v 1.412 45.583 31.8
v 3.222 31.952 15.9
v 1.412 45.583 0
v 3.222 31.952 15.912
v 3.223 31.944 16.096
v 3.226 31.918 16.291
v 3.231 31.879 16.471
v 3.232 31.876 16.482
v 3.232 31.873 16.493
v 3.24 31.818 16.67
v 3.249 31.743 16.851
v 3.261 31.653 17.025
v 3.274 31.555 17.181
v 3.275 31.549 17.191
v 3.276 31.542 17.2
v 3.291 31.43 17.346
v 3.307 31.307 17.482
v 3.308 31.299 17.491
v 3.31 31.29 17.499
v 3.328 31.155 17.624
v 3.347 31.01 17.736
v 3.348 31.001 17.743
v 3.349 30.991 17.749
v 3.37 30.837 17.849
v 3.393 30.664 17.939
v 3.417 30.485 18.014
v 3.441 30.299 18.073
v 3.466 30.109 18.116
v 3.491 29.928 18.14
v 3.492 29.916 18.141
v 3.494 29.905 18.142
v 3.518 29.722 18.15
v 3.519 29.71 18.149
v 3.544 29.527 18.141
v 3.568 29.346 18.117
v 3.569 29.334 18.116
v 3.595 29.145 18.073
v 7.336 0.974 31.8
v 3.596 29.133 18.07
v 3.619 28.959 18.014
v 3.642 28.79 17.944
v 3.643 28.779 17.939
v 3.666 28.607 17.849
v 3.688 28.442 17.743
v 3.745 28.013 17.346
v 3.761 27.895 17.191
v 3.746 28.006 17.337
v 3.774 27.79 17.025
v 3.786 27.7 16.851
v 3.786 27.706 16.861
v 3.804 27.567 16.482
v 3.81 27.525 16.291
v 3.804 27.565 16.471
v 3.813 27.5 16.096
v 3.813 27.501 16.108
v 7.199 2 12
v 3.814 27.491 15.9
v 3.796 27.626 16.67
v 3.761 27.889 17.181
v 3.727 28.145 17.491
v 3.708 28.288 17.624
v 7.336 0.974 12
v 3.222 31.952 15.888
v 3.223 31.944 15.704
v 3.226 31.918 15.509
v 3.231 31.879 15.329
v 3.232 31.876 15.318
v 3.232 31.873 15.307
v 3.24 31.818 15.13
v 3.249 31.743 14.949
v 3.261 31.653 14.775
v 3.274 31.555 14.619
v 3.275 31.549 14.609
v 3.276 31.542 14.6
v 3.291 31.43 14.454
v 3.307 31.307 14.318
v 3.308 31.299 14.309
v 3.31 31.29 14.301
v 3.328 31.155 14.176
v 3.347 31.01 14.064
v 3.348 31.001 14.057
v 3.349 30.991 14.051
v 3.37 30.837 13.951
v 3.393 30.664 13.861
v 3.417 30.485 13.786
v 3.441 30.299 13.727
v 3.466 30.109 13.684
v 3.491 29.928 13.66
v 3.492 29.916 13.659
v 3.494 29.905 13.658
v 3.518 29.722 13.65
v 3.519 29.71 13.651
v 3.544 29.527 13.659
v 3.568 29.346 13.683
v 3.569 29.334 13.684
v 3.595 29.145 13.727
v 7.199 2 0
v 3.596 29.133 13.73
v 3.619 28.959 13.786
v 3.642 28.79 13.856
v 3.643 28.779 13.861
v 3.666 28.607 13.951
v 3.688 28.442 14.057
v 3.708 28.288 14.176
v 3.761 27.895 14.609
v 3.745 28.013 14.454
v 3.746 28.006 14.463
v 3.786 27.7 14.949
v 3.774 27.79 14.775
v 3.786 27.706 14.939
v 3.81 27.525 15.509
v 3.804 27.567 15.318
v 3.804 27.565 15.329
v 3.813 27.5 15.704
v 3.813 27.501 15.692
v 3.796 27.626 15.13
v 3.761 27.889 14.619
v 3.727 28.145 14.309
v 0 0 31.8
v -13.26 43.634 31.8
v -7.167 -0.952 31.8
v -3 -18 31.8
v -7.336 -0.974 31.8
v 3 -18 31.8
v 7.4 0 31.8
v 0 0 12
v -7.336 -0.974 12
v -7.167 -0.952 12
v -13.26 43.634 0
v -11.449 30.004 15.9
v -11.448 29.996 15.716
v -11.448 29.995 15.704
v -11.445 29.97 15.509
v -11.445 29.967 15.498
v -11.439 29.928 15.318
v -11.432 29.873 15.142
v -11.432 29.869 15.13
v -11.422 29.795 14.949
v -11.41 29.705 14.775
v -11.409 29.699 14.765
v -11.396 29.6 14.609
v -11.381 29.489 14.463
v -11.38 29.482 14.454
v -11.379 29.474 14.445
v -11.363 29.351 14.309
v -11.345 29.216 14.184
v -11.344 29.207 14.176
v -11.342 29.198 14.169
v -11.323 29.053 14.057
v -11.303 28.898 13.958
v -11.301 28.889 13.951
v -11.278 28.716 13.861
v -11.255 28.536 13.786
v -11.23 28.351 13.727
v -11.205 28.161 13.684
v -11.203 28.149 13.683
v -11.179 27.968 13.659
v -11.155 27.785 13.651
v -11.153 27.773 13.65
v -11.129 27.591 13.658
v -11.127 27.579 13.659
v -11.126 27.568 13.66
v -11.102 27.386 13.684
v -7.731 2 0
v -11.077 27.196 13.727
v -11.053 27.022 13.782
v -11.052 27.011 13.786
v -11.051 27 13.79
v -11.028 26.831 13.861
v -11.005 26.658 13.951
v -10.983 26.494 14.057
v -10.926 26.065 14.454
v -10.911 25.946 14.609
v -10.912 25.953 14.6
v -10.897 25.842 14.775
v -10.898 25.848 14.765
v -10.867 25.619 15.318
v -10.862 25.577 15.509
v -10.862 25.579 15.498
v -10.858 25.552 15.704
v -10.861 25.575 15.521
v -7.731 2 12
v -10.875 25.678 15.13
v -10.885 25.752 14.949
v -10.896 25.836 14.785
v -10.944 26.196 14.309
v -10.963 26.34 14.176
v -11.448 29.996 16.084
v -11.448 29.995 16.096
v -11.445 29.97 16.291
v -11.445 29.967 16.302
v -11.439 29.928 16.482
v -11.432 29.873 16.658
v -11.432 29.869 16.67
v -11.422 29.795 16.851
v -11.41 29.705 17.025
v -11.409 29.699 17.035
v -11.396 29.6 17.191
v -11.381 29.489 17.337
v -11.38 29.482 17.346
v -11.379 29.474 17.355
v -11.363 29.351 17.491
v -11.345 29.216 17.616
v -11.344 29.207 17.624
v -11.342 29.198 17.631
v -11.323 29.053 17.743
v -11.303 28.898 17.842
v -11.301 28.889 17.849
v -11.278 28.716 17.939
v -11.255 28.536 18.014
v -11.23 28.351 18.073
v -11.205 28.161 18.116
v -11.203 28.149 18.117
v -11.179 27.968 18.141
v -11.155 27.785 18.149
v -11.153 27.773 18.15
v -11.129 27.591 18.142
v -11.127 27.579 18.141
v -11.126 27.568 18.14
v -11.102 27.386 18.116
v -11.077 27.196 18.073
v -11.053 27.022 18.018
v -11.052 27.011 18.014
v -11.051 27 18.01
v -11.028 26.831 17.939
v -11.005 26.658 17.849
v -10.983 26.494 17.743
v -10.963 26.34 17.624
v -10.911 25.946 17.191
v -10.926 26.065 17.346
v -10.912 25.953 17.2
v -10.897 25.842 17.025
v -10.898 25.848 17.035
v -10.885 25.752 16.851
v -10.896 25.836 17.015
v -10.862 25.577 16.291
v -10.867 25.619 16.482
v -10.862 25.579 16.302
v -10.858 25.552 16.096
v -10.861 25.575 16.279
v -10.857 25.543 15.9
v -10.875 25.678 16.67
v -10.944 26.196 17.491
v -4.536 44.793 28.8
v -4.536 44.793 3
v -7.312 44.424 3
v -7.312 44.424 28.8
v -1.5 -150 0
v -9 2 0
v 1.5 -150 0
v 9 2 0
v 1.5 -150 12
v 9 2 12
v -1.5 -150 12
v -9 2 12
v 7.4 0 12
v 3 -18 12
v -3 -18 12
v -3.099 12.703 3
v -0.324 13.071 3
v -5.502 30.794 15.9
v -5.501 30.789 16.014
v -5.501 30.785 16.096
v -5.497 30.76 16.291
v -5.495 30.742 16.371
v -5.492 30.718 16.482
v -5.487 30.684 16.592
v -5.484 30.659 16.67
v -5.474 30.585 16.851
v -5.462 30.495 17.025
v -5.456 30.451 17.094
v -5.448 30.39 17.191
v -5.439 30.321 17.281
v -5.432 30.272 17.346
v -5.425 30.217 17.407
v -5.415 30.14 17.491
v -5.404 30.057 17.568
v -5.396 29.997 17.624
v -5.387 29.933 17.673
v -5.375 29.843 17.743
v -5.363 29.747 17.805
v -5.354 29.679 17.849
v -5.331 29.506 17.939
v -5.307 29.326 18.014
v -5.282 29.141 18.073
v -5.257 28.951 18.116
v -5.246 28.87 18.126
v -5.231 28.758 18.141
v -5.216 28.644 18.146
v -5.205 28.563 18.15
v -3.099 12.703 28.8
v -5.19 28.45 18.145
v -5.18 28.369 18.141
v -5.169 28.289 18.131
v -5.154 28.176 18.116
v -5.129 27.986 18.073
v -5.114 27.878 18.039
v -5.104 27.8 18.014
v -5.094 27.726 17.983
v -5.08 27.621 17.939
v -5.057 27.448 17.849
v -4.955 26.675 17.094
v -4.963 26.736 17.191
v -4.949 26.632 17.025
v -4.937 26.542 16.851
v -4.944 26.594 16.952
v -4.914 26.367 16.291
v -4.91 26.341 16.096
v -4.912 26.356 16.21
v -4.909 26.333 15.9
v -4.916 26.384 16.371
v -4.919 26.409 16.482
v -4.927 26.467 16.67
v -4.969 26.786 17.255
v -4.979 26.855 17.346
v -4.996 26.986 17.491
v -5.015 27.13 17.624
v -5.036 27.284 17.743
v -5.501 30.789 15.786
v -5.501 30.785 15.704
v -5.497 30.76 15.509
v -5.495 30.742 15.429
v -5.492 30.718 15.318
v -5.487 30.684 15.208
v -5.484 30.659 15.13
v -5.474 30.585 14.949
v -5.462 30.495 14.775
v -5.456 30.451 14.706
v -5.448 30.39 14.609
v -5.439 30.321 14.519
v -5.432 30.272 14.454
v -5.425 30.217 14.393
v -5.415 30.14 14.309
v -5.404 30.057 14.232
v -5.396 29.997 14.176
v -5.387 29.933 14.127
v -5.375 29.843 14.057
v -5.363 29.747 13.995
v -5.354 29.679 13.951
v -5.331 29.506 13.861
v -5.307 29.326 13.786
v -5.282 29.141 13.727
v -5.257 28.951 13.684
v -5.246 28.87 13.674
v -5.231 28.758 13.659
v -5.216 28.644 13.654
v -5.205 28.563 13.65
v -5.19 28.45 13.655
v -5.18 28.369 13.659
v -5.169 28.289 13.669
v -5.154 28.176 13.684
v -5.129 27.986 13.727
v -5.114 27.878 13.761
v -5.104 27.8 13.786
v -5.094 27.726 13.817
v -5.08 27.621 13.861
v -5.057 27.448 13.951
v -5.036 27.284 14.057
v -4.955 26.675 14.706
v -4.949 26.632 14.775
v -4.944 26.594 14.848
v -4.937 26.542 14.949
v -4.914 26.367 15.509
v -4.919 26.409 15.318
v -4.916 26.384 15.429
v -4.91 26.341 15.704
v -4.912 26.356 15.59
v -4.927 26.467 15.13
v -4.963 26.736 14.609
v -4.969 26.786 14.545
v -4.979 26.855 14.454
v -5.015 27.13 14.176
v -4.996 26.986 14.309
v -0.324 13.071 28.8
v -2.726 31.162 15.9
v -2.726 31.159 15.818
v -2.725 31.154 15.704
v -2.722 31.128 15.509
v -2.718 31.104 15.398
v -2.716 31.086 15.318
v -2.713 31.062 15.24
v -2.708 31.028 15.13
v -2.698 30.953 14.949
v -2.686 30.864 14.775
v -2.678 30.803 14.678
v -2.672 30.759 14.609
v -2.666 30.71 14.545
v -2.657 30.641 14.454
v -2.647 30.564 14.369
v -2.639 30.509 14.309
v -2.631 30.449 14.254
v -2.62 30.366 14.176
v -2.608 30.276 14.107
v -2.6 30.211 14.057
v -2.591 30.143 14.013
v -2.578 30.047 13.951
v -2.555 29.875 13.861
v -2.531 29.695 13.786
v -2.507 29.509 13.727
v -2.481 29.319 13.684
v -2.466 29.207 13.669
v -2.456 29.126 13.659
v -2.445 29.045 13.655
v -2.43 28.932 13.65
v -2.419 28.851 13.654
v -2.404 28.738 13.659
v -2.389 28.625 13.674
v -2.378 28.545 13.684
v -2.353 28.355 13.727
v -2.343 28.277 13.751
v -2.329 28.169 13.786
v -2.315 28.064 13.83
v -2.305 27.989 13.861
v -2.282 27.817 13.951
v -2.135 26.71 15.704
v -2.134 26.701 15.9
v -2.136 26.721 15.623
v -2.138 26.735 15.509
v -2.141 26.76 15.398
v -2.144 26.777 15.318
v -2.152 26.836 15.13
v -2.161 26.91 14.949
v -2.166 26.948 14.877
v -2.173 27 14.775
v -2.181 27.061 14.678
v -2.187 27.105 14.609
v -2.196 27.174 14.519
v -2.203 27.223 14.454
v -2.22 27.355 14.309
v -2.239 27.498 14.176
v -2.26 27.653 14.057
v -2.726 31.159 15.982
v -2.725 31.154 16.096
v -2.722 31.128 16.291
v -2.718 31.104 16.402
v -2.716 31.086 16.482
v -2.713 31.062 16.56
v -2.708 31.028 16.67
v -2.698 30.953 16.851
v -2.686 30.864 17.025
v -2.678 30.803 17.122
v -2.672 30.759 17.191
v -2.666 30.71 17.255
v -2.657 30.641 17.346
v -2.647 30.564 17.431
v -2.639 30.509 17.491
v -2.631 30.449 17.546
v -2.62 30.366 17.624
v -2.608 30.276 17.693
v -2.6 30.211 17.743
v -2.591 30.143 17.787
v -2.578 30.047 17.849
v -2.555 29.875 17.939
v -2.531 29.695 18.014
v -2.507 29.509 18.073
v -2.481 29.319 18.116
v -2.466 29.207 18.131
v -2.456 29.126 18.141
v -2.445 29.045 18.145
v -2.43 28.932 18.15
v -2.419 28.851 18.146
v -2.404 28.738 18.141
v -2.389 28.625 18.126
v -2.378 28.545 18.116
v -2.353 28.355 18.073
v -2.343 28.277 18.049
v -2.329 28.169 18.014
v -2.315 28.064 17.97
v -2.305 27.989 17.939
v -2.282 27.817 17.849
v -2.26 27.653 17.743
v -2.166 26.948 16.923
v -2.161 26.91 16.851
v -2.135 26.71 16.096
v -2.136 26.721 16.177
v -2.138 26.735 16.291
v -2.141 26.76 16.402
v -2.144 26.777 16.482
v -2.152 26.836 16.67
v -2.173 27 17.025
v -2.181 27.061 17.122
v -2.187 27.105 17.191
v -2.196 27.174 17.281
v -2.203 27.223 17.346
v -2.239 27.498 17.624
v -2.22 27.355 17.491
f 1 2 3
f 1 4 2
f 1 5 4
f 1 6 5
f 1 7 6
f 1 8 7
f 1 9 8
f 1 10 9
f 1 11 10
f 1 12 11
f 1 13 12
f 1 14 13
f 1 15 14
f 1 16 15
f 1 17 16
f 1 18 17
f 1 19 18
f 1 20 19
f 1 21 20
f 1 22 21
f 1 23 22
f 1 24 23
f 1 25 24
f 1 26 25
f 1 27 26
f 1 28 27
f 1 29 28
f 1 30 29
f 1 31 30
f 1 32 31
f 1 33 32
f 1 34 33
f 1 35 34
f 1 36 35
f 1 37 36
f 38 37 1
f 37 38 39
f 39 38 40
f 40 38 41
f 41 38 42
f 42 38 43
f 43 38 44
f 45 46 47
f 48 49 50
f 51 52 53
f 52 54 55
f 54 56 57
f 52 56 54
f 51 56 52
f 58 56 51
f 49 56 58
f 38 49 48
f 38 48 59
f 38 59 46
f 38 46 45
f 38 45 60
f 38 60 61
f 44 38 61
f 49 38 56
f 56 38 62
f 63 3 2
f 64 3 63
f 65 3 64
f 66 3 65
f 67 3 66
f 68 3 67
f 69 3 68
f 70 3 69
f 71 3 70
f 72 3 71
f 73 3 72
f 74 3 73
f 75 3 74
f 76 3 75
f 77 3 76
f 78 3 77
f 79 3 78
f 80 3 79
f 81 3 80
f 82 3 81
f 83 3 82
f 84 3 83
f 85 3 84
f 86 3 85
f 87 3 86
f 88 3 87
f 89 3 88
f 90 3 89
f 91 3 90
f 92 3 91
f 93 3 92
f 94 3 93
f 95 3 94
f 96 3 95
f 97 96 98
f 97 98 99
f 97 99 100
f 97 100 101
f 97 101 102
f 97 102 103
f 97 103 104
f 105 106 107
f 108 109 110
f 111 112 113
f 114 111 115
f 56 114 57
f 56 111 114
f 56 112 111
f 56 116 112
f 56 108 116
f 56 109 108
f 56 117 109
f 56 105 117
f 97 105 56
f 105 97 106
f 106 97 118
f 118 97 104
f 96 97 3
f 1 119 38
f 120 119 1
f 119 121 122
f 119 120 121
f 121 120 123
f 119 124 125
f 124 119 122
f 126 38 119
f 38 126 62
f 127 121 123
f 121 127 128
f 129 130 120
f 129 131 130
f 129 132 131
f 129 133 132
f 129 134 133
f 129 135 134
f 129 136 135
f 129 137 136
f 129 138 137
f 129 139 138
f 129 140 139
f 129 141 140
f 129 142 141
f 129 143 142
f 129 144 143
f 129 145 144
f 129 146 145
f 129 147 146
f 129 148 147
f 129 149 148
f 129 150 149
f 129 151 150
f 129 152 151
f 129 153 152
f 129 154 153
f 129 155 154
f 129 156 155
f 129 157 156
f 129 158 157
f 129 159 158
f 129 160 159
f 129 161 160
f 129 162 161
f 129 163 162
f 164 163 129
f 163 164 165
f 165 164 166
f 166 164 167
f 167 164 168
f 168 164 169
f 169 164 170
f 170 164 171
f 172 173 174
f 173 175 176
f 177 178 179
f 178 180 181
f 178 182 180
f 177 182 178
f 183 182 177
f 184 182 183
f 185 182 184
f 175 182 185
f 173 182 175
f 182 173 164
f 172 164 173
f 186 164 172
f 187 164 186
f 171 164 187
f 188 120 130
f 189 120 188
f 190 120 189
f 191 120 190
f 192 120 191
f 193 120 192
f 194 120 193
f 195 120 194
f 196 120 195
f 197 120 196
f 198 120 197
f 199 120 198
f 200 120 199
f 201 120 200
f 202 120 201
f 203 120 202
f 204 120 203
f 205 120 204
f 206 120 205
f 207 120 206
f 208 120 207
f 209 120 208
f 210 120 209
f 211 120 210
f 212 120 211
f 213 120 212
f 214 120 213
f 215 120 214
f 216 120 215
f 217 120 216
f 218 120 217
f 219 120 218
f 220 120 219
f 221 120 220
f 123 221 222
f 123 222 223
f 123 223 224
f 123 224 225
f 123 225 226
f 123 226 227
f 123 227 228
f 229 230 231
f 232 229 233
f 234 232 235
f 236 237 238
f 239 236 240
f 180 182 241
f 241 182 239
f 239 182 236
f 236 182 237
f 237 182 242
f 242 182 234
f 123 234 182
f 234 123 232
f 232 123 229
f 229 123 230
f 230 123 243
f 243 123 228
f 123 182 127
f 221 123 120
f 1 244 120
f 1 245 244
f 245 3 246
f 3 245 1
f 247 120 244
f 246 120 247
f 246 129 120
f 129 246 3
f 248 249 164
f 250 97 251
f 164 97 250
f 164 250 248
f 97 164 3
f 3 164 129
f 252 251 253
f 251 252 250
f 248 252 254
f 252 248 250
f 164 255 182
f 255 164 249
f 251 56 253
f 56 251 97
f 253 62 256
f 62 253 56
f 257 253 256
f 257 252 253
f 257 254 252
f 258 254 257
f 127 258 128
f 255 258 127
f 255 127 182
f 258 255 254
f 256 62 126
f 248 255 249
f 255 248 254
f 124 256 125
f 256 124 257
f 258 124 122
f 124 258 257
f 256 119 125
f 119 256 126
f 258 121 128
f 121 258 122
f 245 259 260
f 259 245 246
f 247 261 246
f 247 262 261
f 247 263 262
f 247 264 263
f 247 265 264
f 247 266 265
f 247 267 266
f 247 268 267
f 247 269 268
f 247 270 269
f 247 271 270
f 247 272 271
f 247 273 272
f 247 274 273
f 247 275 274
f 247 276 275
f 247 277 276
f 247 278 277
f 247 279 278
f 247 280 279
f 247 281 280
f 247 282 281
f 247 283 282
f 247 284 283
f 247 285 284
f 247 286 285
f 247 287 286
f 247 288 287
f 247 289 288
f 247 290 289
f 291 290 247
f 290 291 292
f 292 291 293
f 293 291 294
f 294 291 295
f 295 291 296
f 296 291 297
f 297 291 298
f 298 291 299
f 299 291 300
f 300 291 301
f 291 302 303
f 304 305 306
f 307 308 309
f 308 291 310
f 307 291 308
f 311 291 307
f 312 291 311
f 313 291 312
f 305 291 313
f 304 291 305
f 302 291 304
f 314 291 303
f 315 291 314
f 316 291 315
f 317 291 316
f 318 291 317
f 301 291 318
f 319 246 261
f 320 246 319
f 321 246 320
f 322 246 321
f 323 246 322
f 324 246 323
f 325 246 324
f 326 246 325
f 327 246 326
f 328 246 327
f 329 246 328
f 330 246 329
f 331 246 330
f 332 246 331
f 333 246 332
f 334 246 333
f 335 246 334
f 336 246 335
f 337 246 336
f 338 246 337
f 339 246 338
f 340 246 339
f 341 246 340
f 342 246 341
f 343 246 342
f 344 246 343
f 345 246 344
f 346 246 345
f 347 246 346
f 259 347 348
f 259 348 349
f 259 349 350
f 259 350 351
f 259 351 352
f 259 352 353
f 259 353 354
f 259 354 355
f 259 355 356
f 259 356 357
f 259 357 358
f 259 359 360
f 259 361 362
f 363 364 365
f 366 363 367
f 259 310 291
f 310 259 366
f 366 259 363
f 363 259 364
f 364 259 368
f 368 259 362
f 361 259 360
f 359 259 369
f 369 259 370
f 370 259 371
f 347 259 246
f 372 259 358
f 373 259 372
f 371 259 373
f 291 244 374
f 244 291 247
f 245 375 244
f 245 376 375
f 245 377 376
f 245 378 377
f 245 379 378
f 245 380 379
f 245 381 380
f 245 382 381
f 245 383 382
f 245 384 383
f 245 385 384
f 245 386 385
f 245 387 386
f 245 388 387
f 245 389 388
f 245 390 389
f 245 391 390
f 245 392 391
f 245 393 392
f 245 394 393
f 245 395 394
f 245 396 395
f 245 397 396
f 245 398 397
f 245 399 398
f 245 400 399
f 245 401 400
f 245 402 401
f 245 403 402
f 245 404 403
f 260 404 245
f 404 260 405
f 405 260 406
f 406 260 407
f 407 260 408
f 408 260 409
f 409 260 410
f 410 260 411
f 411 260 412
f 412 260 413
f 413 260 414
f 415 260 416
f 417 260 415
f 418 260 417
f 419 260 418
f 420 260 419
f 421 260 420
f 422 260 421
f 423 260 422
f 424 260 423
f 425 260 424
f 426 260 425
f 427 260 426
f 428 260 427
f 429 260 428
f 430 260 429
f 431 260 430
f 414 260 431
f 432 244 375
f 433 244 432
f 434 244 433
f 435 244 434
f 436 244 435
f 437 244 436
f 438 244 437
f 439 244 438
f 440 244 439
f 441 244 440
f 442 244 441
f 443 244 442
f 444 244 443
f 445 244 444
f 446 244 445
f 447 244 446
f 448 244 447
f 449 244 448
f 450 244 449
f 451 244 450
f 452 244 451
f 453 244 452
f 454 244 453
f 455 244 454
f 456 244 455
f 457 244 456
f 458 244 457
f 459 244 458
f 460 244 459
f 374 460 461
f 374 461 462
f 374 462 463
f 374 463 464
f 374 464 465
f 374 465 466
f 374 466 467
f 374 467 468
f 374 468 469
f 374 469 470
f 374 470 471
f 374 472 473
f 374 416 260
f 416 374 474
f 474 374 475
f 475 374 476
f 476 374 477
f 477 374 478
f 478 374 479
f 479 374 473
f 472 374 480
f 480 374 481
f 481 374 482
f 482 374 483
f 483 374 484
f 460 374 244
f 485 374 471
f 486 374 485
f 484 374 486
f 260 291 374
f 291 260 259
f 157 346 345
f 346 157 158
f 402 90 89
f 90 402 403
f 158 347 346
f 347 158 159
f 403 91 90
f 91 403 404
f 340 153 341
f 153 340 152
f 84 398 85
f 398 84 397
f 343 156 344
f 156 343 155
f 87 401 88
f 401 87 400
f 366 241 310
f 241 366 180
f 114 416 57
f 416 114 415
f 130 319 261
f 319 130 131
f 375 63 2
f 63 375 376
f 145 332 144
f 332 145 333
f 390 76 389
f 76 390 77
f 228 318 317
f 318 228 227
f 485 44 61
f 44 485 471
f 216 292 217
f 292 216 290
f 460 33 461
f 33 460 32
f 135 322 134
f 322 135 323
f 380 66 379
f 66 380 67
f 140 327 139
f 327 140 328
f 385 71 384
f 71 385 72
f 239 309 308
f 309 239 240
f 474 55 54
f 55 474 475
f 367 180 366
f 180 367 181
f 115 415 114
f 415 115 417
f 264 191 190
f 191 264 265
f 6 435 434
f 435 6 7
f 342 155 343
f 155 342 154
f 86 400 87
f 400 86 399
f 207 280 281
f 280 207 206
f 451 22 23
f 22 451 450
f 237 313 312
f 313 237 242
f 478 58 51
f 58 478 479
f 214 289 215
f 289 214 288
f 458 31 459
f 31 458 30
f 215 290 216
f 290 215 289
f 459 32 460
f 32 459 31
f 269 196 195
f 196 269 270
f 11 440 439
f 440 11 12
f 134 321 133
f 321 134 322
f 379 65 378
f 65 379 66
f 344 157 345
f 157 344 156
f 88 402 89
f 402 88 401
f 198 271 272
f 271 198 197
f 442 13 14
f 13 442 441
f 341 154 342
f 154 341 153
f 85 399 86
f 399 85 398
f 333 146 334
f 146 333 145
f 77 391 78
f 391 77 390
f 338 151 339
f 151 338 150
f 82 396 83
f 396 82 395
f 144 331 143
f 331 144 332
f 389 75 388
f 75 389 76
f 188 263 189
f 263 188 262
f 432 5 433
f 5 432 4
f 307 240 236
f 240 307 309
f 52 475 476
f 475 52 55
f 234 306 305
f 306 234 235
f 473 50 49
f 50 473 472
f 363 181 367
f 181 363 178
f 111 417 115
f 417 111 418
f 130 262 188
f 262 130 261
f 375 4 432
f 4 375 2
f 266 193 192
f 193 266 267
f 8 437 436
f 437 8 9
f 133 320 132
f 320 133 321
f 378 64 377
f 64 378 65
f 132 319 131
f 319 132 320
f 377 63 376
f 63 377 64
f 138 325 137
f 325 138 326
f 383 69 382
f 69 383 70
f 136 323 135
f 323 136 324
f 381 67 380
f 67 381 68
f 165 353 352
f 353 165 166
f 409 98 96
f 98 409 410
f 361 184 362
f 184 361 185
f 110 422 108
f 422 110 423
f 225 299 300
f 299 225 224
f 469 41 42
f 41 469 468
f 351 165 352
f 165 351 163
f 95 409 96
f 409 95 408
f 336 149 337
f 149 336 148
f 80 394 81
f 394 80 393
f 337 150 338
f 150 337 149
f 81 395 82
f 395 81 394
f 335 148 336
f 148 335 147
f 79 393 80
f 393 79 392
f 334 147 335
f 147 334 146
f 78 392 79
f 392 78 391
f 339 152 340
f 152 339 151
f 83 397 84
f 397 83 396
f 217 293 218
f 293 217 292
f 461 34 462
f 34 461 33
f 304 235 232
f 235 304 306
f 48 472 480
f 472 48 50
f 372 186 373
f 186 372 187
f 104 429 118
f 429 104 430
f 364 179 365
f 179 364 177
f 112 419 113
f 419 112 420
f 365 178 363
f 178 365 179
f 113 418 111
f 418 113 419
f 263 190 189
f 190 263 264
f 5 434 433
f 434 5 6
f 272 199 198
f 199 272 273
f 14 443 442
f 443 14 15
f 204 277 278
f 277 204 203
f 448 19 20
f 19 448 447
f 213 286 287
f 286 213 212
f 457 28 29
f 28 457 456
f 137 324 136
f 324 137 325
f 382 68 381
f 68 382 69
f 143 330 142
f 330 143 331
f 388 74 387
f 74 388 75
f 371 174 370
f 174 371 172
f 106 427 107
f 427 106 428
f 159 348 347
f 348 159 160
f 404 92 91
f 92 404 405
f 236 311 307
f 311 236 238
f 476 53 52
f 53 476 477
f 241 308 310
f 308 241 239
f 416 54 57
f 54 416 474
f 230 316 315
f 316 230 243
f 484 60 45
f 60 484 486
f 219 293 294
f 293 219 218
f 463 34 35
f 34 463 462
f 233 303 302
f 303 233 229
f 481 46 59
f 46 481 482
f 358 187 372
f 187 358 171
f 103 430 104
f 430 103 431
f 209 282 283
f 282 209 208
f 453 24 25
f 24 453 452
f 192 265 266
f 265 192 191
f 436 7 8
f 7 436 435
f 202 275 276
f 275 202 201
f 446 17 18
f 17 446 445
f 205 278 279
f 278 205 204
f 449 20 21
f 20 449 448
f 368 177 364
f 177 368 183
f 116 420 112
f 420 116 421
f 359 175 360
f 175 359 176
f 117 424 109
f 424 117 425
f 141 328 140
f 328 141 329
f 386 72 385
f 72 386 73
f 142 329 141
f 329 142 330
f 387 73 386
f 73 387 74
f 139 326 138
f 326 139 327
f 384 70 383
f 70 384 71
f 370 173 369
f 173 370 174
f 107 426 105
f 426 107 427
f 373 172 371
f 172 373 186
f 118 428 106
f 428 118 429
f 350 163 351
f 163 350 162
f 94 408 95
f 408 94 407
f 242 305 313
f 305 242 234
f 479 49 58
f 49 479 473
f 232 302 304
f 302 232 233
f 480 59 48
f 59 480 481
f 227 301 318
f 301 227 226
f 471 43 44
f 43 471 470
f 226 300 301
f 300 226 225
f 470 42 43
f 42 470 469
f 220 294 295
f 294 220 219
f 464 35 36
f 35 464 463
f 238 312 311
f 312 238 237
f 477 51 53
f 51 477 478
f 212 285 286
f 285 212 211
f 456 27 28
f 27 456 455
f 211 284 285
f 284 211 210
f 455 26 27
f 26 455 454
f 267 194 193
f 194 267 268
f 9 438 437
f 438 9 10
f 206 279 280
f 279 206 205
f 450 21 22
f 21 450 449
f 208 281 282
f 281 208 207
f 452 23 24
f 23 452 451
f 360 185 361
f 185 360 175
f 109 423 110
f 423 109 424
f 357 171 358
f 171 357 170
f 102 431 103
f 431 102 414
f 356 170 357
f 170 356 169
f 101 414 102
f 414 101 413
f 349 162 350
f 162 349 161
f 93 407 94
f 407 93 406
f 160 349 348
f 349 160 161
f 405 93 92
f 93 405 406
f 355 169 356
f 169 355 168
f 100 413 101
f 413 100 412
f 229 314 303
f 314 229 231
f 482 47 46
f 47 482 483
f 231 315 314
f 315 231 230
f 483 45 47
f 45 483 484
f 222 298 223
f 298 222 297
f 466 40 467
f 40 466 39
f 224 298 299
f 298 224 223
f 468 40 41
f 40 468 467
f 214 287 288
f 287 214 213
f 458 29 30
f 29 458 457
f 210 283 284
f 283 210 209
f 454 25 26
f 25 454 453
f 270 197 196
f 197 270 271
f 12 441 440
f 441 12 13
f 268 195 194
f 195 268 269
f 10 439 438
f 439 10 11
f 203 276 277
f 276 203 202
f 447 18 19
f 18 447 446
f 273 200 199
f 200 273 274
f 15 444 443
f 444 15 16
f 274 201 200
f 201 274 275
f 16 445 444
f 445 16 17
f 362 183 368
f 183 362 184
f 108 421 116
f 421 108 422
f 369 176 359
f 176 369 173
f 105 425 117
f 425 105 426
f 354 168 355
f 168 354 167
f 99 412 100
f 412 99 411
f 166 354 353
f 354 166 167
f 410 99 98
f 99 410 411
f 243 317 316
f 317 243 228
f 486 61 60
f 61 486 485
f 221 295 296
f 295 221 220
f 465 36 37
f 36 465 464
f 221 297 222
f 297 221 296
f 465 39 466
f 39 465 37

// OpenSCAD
// file: lib.scad
// Shared pieces for the Winterlight PETG parts (Bambu Lab A1, 256 × 256 × 256 mm).
// Millimetres. Measure your own mounting strip and set strip_w / strip_t on the
// command line (-D strip_w=20) or in OpenSCAD's Customizer before printing.
$fn = 72;
strip_w = 25;   // pixel mounting strip width
strip_t = 2;    // pixel mounting strip thickness
clr = 0.4;      // clearance per side, a snug slide fit in PETG
wall = 3;       // channel walls
tie_d = 4.5;    // holes for the 2.5 mm cable ties or an M4 bolt

slot_t = strip_t + 2*clr;
slot_w = strip_w + 2*clr;
// Outside size of a strip channel: radial depth and tangential width.
ch_depth = slot_t + wall;
ch_width = slot_w + 2*wall;

// A channel that holds a strip's end: the strip runs up +Z with its face
// (and its pixels) towards +X. Open on the +X side so the strip drops in,
// with a groove round the outside where a cable tie pulls it home.
module channel(h, floor = 3) {
  z0 = h*0.55;
  difference() {
    translate([-ch_depth, -ch_width/2, 0]) cube([ch_depth, ch_width, h]);
    translate([-slot_t, -slot_w/2, floor]) cube([slot_t + 1, slot_w, h]);
    // Tie groove, 1 mm deep, round the back and both sides.
    difference() {
      translate([-ch_depth - 1, -ch_width/2 - 1, z0]) cube([ch_depth + 2, ch_width + 2, 5]);
      translate([-ch_depth + 1, -ch_width/2 + 1, z0 - 1]) cube([ch_depth + 2, ch_width - 2, 7]);
    }
  }
}

// n channels on a circle of radius r (the strip's face), leaning by tilt
// degrees: positive leans the top inwards, negative outwards.
module channel_ring(n, r, tilt, h, start = 0) {
  intersection() {
    for (i = [0 : n - 1]) rotate([0, 0, start + 360*i/n])
      translate([r, 0, 0]) rotate([0, -tilt, 0]) channel(h);
    translate([-1000, -1000, 0]) cube([2000, 2000, 1000]);
  }
}

// A flat ring with spokes to a centre boss: the plate that ties the channels together.
module spoked_ring(r_out, r_in, t, n, boss_d, arm_w = 8) {
  difference() { cylinder(r = r_out, h = t); translate([0, 0, -1]) cylinder(r = r_in, h = t + 2); }
  for (i = [0 : n - 1]) rotate([0, 0, 360*i/n + 180/n]) translate([0, -arm_w/2, 0]) cube([r_in + 1, arm_w, t]);
  cylinder(d = boss_d, h = t);
}
// main file
// Wireframe tree, ground peg: one per strand, on the 42 cm circle round the
// pole. The strand's end slides into the pocket, leaning in towards the hub;
// drill the strip through the side hole and tie it so the strand can be pulled
// tight. Printed lying on its side (as laid out here), no supports.
// Print X = outwards from the pole, print Y = up, print Z = round the tree.
include <lib.scad>
r_base = 420;
r_hub = 88;
height = 2500;
tilt = atan((r_base - r_hub)/height);
spike = 150;     // into the ground
head_h = 45;
head_w = slot_t + 2*6;
pocket = 32;
spike_t = 12;

difference() {
  union() {
    linear_extrude(ch_width) rotate(tilt) translate([-head_w/2, 0]) square([head_w, head_h]);
    linear_extrude(spike_t) polygon([[-9, 2], [9, 2], [1.5, -spike], [-1.5, -spike]]);
    // Fillet the head onto the spike.
    linear_extrude(ch_width) polygon([[-head_w/2, 0], [head_w/2, 0], [3, -18], [-3, -18]]);
  }
  // Pocket for the strip, open at the top of the head.
  translate([0, 0, wall]) linear_extrude(slot_w) rotate(tilt) translate([-slot_t/2, head_h - pocket]) square([slot_t, pocket + 1]);
  // Tie hole across the pocket, outwards.
  rotate([0, 0, tilt]) translate([0, head_h - pocket/2, ch_width/2]) rotate([0, 90, 0]) cylinder(d = tie_d, h = head_w + 2, center = true);
}
